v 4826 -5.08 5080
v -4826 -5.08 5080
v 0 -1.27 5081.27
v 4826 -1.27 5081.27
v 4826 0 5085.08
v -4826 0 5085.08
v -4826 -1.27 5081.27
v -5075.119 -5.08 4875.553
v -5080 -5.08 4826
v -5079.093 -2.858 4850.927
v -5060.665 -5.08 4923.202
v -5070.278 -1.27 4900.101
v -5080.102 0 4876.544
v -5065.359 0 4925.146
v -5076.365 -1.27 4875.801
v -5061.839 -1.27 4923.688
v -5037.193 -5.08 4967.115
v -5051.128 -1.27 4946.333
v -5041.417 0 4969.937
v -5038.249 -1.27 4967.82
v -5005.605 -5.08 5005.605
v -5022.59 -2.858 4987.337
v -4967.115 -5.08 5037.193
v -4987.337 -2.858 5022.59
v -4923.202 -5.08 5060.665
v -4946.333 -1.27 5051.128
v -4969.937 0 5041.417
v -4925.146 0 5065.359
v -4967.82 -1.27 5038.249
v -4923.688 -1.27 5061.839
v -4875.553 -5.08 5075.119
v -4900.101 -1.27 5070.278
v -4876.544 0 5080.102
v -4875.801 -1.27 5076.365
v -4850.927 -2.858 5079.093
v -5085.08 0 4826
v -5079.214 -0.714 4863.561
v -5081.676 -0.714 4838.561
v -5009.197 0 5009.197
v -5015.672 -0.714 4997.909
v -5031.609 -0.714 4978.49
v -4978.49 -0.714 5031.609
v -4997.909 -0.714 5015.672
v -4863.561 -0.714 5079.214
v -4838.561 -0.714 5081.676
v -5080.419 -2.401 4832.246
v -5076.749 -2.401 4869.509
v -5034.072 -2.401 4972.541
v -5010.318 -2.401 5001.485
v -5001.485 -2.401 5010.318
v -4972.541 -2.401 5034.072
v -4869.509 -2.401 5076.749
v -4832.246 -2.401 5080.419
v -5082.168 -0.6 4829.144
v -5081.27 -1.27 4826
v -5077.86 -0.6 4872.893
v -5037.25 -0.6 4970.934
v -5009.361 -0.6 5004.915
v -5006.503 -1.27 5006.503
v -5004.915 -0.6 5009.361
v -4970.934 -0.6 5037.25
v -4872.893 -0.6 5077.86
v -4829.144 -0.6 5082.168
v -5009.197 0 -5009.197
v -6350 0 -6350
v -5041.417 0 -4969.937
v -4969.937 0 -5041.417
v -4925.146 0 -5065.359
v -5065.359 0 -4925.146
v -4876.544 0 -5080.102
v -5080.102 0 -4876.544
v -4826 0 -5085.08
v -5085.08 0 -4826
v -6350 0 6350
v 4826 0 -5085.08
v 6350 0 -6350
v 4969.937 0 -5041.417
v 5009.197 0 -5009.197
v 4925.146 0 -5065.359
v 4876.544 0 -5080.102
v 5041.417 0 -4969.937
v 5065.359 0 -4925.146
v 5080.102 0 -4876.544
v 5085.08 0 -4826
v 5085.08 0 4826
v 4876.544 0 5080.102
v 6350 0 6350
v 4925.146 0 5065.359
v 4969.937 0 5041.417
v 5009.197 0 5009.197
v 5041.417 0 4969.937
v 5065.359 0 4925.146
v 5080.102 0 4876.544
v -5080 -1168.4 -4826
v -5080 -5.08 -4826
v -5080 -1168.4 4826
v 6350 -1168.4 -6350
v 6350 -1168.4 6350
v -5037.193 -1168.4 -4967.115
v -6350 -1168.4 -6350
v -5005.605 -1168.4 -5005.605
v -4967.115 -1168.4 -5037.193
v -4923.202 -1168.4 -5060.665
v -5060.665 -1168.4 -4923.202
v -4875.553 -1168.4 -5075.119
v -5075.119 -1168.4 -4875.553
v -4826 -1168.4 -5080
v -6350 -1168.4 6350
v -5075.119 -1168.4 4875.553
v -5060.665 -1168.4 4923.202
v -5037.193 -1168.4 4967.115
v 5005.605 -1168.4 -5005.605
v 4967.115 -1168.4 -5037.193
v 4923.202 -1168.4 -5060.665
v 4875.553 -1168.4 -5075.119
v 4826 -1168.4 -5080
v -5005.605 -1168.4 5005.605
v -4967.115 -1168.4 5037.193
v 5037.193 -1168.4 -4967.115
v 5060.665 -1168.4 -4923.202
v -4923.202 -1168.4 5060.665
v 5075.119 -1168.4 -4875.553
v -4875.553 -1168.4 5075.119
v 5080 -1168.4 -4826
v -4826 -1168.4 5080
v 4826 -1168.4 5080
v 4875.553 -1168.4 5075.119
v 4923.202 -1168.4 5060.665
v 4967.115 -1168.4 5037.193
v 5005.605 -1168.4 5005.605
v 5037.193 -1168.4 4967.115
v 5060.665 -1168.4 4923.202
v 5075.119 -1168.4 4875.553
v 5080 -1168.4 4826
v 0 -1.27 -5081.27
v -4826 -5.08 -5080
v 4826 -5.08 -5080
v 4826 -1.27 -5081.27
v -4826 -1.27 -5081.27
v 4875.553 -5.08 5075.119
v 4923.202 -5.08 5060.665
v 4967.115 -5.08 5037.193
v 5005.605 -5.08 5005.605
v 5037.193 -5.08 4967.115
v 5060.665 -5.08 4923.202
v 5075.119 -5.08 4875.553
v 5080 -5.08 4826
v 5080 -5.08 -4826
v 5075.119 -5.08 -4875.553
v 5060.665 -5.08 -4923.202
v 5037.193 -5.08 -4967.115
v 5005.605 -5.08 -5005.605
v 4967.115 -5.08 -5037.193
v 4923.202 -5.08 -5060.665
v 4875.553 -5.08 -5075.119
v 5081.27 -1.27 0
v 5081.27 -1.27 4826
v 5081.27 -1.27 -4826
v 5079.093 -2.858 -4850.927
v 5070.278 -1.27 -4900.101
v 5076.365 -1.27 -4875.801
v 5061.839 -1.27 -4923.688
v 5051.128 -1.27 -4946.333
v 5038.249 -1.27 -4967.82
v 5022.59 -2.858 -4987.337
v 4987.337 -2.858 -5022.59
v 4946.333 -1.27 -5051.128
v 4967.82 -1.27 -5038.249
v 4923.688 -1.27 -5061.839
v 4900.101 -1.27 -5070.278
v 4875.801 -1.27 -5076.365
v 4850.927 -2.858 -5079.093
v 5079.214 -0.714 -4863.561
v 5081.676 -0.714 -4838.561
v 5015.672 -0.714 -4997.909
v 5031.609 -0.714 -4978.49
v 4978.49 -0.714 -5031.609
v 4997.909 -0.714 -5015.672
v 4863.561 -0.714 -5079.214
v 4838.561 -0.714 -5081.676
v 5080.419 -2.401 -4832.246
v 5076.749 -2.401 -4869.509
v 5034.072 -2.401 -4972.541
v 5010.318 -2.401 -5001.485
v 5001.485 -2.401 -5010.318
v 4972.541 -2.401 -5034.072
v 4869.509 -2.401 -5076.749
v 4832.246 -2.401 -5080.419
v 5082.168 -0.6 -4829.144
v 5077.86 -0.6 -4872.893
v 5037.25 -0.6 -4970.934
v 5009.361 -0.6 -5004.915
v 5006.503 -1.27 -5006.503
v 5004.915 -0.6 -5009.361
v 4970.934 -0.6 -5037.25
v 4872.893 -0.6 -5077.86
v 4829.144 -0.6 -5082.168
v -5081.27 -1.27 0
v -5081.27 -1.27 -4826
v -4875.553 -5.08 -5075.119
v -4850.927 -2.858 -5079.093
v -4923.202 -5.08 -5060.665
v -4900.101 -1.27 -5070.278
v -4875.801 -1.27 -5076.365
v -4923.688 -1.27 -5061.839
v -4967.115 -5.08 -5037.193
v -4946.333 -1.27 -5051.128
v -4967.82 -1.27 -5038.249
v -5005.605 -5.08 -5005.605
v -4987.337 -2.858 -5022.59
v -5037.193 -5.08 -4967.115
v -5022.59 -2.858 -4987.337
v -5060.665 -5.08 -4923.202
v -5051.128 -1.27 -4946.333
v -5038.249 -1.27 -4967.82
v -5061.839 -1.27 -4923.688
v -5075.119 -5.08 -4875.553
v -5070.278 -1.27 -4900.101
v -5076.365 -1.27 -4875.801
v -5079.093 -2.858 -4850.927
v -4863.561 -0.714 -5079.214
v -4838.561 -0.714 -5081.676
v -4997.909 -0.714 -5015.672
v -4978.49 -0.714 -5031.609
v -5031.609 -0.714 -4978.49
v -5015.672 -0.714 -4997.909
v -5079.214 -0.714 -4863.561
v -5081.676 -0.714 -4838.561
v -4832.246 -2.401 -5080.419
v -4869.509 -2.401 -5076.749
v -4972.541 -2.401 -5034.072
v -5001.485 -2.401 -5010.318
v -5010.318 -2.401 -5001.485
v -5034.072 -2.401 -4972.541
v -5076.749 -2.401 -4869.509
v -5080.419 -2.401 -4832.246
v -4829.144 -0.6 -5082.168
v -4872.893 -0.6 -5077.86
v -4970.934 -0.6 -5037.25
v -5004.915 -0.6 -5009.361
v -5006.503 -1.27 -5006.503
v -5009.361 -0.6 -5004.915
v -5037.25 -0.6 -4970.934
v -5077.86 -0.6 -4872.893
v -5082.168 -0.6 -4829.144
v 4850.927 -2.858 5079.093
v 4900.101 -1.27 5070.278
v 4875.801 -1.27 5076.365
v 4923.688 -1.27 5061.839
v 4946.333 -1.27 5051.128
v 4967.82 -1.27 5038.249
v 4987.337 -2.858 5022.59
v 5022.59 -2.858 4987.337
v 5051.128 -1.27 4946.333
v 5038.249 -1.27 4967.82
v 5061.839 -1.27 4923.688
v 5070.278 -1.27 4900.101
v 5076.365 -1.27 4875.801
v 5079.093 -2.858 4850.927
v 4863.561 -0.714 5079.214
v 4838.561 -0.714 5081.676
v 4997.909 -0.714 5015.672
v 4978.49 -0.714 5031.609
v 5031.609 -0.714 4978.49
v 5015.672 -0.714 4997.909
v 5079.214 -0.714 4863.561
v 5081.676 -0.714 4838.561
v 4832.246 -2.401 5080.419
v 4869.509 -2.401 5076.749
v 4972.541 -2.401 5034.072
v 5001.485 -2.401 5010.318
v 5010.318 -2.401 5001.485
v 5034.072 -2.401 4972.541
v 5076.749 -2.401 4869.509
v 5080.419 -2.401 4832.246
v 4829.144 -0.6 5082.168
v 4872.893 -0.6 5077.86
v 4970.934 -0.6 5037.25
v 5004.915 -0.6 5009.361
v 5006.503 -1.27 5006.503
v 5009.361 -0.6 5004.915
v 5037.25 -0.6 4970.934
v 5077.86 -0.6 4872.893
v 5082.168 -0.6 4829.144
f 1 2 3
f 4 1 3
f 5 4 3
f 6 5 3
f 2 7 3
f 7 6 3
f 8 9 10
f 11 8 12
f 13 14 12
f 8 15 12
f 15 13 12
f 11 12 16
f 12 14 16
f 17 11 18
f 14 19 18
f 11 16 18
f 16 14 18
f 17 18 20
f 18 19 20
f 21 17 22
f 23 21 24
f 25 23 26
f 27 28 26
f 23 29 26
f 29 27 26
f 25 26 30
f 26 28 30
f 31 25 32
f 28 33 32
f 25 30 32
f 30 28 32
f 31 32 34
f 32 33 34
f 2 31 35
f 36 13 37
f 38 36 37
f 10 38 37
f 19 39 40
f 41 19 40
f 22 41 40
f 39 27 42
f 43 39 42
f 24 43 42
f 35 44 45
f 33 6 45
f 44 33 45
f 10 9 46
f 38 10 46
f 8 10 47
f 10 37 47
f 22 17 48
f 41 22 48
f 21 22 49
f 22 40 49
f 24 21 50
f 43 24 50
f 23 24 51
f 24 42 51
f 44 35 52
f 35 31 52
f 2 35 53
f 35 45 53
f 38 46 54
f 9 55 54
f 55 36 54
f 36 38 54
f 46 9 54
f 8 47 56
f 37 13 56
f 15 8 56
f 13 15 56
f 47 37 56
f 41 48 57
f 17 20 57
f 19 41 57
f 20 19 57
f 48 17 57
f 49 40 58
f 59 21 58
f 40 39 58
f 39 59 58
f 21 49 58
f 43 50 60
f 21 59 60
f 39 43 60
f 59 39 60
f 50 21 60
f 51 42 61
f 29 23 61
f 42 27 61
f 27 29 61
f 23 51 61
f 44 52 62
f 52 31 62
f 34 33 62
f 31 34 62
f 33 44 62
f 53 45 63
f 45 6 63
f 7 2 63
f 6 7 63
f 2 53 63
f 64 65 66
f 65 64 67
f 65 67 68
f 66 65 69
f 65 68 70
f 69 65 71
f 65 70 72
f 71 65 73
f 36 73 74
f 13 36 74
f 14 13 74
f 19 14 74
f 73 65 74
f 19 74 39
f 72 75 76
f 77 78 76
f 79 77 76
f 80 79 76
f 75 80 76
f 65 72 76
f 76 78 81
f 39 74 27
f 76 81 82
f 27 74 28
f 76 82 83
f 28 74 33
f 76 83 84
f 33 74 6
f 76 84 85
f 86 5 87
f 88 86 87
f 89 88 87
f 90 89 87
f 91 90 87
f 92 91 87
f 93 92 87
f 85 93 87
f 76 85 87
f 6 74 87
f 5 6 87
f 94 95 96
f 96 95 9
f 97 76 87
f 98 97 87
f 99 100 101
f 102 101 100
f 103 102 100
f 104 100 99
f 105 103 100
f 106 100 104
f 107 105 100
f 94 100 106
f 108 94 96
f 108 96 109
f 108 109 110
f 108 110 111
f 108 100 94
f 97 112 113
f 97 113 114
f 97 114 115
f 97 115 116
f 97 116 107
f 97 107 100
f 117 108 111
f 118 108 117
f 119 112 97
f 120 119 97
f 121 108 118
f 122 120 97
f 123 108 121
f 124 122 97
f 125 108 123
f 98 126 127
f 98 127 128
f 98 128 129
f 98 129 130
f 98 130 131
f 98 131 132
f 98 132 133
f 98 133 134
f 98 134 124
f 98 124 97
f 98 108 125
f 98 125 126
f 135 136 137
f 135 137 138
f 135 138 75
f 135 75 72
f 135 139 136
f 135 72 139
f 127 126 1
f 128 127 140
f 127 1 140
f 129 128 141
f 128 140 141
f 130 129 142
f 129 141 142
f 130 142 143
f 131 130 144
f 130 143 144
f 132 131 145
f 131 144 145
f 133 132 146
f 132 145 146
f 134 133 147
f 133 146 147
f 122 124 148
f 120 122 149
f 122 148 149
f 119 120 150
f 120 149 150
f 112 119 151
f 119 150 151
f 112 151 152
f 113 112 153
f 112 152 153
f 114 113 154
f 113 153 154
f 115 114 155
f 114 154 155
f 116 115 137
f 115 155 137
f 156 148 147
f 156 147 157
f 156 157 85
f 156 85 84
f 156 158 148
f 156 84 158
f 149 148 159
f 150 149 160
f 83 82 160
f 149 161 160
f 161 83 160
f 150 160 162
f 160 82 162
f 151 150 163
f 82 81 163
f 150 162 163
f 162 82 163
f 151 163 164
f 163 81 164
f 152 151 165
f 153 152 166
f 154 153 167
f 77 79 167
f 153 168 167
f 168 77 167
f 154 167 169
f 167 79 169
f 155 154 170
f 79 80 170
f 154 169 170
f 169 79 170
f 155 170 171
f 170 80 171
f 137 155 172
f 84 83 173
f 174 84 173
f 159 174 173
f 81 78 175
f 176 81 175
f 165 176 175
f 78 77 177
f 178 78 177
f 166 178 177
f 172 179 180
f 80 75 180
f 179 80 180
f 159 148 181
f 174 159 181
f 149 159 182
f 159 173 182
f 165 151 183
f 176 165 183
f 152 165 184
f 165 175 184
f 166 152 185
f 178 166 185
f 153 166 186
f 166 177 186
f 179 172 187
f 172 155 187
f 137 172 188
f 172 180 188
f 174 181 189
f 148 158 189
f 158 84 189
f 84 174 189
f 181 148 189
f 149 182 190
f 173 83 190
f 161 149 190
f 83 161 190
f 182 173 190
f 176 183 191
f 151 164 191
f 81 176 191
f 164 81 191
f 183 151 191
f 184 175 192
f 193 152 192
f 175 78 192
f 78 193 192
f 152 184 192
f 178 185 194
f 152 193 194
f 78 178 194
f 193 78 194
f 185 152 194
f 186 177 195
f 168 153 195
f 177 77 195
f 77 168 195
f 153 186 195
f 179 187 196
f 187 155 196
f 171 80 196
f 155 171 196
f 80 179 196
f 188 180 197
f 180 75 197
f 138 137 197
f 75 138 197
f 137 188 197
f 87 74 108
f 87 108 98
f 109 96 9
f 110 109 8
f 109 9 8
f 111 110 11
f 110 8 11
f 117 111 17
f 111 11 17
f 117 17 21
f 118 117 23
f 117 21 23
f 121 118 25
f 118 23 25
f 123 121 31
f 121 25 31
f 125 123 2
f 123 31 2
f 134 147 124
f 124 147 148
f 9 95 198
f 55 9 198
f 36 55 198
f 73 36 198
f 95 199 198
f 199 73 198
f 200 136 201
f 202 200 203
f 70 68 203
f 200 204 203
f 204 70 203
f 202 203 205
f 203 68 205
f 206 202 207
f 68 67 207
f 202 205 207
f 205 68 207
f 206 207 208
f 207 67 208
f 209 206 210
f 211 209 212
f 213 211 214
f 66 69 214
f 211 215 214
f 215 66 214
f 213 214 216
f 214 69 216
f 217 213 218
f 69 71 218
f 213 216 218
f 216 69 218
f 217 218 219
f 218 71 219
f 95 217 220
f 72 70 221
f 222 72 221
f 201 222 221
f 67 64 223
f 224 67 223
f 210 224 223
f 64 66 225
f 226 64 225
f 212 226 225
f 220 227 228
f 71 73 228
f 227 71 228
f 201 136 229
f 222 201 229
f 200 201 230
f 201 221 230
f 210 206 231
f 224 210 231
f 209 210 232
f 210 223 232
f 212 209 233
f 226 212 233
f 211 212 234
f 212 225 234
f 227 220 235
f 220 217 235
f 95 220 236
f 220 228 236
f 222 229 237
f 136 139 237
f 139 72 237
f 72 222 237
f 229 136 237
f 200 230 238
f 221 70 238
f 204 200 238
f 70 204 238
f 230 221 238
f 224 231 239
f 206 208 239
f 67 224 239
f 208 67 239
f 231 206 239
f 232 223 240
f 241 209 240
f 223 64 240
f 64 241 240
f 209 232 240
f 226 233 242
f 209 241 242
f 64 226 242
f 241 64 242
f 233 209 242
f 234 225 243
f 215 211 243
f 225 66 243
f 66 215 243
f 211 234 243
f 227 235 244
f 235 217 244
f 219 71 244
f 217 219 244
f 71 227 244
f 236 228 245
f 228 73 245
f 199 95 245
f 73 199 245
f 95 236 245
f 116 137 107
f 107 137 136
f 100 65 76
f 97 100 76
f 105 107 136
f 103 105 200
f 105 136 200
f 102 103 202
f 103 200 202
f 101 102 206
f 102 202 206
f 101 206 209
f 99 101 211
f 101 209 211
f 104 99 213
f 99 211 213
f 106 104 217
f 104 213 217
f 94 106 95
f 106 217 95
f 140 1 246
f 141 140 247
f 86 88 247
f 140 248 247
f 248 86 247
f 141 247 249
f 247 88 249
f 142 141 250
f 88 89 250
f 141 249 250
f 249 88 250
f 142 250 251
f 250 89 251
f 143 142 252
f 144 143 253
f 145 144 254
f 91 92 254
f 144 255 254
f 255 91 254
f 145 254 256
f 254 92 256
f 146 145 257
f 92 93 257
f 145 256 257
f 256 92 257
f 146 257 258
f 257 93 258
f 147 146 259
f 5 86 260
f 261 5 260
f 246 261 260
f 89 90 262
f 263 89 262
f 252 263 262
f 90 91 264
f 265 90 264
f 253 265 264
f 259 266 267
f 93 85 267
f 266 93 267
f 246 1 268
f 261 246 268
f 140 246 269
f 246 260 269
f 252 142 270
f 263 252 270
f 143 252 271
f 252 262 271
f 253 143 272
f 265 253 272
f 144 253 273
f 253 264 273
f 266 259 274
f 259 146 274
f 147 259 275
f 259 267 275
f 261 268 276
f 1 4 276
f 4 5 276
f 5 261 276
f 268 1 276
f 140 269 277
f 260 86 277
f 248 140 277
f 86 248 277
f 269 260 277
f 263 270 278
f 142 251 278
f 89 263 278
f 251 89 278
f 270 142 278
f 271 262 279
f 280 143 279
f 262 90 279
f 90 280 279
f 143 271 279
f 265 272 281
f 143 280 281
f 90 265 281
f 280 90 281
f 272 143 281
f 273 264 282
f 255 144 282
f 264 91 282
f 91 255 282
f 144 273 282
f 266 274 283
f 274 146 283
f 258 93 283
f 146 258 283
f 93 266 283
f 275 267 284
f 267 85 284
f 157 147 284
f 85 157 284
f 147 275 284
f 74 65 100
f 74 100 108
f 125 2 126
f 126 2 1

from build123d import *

# Parameters (mm, degrees)
F0_W         = 12700
F0_H         = 12700
F1_DEPTH     = 1168.4
F2_T1_DEPTH  = 9652
F2_T3_DEPTH  = 9652
F2_T6_ANGLE  = 90
F2_T8_ANGLE  = 90
F2_T10_ANGLE = 90
F2_T12_ANGLE = 90


# Not quite as in the source:
# - a fillet or chamfer that OpenCascade refuses, or shapes differently, is made with other operations: its cross-section is extruded or revolved along the edge and cut away or added


with BuildPart() as f1:
    # F0 (on Front) → F1 (new body)
    with BuildSketch(Plane.XZ):
        Rectangle(F0_W, F0_H)
        with BuildLine():
            Line((-5080, -4826), (-5080, 4826))
            ThreePointArc((-5080, 4826), (-5005.6051224214, 5005.6051224214), (-4826, 5080))
            Line((-4826, 5080), (4826, 5080))
            ThreePointArc((4826, 5080), (5005.6051224214, 5005.6051224214), (5080, 4826))
            Line((5080, 4826), (5080, -4826))
            ThreePointArc((5080, -4826), (5005.6051224214, -5005.6051224214), (4826, -5080))
            Line((4826, -5080), (-4826, -5080))
            ThreePointArc((-4826, -5080), (-5005.6051224214, -5005.6051224214), (-5080, -4826))
        make_face(mode=Mode.SUBTRACT)
    extrude(amount=F1_DEPTH)

    # F2: fillet of radius 5.08 on 4 edges, made by hand

    # F2_s2 → F2_t1 (cut)
    with BuildSketch(Plane.YZ.offset(-4826)):
        with BuildLine():
            add(Edge.make_bspline(
                [(-5.08, -5080), (0, -5080), (0, -5085.08)],
                knots=[0, 0, 0, 1, 1, 1], degree=2, weights=[1, 1, 1]))
            Line((0, -5085.08), (0, -5080))
            Line((0, -5080), (-5.08, -5080))
        make_face()
        with BuildLine():
            add(Edge.make_bspline(
                [(-5.08, 5080), (0, 5080), (0, 5085.08)],
                knots=[0, 0, 0, 1, 1, 1], degree=2, weights=[1, 1, 1]))
            Line((0, 5085.08), (0, 5080))
            Line((0, 5080), (-5.08, 5080))
        make_face()
    extrude(amount=F2_T1_DEPTH, mode=Mode.SUBTRACT)

    # F2_s4 → F2_t3 (cut)
    with BuildSketch(Plane.XY.offset(-4826)):
        with BuildLine():
            add(Edge.make_bspline(
                [(-5080, -5.08), (-5080, 0), (-5085.08, 0)],
                knots=[0, 0, 0, 1, 1, 1], degree=2, weights=[1, 1, 1]))
            Line((-5085.08, 0), (-5080, 0))
            Line((-5080, 0), (-5080, -5.08))
        make_face()
        with BuildLine():
            add(Edge.make_bspline(
                [(5080, -5.08), (5080, 0), (5085.08, 0)],
                knots=[0, 0, 0, 1, 1, 1], degree=2, weights=[1, 1, 1]))
            Line((5085.08, 0), (5080, 0))
            Line((5080, 0), (5080, -5.08))
        make_face()
    extrude(amount=F2_T3_DEPTH, mode=Mode.SUBTRACT)

    # F2_s5 → F2_t6 (revolve, cut)
    with BuildSketch(Plane.XY.offset(4826)):
        with BuildLine():
            add(Edge.make_bspline(
                [(-5080, -5.08), (-5080, 0), (-5085.08, 0)],
                knots=[0, 0, 0, 1, 1, 1], degree=2, weights=[1, 1, 1]))
            Line((-5085.08, 0), (-5080, 0))
            Line((-5080, 0), (-5080, -5.08))
        make_face()
    revolve(axis=Axis((-4826, 0, 4826), (0, 1, 0)), revolution_arc=F2_T6_ANGLE, mode=Mode.SUBTRACT)

    # F2_s7 → F2_t8 (revolve, cut)
    with BuildSketch(Plane.YZ.offset(4826)):
        with BuildLine():
            add(Edge.make_bspline(
                [(-5.08, 5080), (0, 5080), (0, 5085.08)],
                knots=[0, 0, 0, 1, 1, 1], degree=2, weights=[1, 1, 1]))
            Line((0, 5085.08), (0, 5080))
            Line((0, 5080), (-5.08, 5080))
        make_face()
    revolve(axis=Axis((4826, 0, 4826), (0, 1, 0)), revolution_arc=F2_T8_ANGLE, mode=Mode.SUBTRACT)

    # F2_s9 → F2_t10 (revolve, cut)
    with BuildSketch(Plane.XY.offset(-4826)):
        with BuildLine():
            add(Edge.make_bspline(
                [(5080, -5.08), (5080, 0), (5085.08, 0)],
                knots=[0, 0, 0, 1, 1, 1], degree=2, weights=[1, 1, 1]))
            Line((5085.08, 0), (5080, 0))
            Line((5080, 0), (5080, -5.08))
        make_face()
    revolve(axis=Axis((4826, 0, -4826), (0, 1, 0)), revolution_arc=F2_T10_ANGLE, mode=Mode.SUBTRACT)

    # F2_s11 → F2_t12 (revolve, cut)
    with BuildSketch(Plane.YZ.offset(-4826)):
        with BuildLine():
            add(Edge.make_bspline(
                [(-5.08, -5080), (0, -5080), (0, -5085.08)],
                knots=[0, 0, 0, 1, 1, 1], degree=2, weights=[1, 1, 1]))
            Line((0, -5085.08), (0, -5080))
            Line((0, -5080), (-5.08, -5080))
        make_face()
    revolve(axis=Axis((-4826, 0, -4826), (0, 1, 0)), revolution_arc=F2_T12_ANGLE, mode=Mode.SUBTRACT)


solid = f1.part
